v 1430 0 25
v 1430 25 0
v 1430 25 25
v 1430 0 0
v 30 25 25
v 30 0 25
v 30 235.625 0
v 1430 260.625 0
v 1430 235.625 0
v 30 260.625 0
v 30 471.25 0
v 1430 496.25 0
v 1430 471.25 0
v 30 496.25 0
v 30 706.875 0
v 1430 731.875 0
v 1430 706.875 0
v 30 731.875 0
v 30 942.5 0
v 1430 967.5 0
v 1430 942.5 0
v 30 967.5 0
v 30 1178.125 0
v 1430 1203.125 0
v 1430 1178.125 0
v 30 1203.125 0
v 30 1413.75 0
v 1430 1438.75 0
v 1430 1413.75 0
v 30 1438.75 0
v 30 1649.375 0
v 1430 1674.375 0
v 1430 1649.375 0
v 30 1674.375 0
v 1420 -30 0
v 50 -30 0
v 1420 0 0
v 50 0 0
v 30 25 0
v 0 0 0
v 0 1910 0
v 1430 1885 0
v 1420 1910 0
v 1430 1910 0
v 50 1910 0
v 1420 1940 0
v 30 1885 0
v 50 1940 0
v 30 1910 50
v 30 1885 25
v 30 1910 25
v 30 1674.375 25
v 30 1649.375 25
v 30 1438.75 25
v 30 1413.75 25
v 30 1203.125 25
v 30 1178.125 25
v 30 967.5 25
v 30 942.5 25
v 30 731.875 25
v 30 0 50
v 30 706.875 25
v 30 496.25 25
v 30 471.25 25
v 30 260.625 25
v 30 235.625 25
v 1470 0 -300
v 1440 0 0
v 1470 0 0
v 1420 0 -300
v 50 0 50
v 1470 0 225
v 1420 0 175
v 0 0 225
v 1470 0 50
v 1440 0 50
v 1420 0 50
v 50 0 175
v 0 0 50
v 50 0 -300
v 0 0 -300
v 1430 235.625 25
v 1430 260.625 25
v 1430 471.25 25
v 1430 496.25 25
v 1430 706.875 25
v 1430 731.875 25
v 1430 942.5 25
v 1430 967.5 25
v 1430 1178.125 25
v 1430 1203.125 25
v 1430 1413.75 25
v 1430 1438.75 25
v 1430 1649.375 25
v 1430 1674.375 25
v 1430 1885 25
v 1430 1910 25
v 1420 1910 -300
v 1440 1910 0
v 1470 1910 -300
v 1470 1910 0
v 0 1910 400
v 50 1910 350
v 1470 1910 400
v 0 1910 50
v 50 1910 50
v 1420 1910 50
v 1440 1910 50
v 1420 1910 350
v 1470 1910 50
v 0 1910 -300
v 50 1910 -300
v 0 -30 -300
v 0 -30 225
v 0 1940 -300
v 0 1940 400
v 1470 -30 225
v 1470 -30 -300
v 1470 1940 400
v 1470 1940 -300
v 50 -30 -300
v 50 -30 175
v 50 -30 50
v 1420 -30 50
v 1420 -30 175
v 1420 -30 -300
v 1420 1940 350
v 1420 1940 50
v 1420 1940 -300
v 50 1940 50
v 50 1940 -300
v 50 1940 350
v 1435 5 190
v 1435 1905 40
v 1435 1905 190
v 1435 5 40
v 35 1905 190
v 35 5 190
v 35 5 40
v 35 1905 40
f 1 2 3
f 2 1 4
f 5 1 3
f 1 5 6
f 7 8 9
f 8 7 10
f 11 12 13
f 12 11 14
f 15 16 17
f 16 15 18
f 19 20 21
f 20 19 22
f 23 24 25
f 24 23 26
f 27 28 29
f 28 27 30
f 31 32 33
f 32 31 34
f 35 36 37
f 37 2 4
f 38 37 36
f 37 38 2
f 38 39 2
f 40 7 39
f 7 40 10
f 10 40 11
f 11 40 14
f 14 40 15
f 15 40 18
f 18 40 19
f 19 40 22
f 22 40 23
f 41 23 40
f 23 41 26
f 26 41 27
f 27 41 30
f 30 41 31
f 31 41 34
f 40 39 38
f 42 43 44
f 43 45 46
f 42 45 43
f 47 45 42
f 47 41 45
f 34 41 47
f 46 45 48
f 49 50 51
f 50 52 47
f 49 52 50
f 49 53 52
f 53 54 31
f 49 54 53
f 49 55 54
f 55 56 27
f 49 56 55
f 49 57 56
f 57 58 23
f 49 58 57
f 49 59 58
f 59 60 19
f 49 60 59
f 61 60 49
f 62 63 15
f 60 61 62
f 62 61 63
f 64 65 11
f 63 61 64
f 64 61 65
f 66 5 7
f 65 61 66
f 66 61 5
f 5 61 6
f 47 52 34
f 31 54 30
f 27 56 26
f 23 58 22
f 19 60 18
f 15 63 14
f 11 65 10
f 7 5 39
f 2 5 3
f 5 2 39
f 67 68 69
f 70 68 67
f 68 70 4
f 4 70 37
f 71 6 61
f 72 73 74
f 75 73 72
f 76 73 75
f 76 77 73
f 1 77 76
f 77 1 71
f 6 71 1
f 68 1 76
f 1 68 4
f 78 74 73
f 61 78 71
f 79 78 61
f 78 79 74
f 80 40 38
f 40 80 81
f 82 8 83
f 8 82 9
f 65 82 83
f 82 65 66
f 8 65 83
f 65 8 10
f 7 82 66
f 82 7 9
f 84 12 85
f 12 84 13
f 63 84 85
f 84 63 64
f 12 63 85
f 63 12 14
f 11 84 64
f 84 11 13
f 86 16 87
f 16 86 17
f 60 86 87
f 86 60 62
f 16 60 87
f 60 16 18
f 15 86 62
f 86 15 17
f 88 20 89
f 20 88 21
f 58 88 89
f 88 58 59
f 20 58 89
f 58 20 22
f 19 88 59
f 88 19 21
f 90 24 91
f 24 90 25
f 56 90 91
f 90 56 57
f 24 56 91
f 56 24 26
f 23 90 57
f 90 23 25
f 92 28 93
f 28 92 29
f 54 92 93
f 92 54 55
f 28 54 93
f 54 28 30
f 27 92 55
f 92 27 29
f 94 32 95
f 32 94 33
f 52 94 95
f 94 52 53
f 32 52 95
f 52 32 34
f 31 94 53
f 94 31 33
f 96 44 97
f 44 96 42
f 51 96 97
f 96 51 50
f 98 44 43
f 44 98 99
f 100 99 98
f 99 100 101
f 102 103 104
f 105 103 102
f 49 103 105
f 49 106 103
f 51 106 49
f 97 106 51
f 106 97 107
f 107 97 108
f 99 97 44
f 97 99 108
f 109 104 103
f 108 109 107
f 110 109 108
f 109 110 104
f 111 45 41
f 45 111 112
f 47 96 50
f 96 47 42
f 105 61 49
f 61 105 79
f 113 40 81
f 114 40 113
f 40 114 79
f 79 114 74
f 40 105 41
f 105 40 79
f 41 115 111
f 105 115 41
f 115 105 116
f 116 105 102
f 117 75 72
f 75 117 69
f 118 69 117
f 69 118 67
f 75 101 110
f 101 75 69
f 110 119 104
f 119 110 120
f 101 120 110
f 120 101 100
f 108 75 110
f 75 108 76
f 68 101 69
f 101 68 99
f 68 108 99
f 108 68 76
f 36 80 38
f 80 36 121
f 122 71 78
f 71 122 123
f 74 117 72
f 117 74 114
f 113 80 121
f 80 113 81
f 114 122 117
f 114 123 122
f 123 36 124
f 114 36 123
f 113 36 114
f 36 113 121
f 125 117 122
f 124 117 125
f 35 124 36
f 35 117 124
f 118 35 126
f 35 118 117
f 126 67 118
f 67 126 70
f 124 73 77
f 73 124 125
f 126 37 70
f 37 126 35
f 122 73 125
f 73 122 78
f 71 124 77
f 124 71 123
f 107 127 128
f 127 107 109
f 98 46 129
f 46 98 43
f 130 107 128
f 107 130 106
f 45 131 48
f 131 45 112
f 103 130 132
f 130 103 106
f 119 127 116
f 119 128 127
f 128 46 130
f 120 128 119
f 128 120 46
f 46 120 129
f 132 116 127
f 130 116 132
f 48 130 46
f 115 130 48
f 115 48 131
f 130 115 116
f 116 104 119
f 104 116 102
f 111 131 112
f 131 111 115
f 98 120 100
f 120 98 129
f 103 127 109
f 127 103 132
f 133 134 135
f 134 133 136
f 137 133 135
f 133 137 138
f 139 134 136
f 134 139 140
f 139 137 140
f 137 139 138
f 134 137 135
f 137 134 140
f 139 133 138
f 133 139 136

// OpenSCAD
main_h = 30;
main_w = 50;

travessa_h = 25;
travessa_w = 25;

mattress_w = 1400;
mattress_l = 1900;
mattress_h = 150;

foot_h = 300;
footer_h = foot_h + travessa_w + mattress_h + main_w;
header_h = 700;

folga = 10;

estrado_h = 15;

WHITE = [ 1.0, 1.0, 1.0 ];
BLACK = [ 0.0, 0.0, 0.0 ];

N = 9;

del = ( mattress_l + folga - N * travessa_h ) / ( N - 1 );
echo( del );
echo( N * ( mattress_w + folga ) );

    // Laterais:
    
    translate( [ 0, 0, 0 ] )
        color( BLACK ) cube( [ main_h, mattress_l + folga, main_w ] );
    
    translate( [ mattress_w + folga + main_h, 0, 0 ] )
        color( BLACK ) cube( [ main_h, mattress_l + folga, main_w ] );
    
    // "pezeira":
    translate( [ 0, -main_h, -foot_h ] )
        color( BLACK ) cube( [ main_w, main_h, footer_h ] );
    translate( [ mattress_w + main_w - main_h, -main_h, -foot_h ] )
        color( BLACK ) cube( [ main_w, main_h, footer_h ] );
    translate( [ 0, -main_h, footer_h - foot_h - main_w ] )
        color( BLACK ) cube( [ mattress_w + folga + 2 * main_h, main_h, main_w ] );

    
    // Transversais:
    translate( [ main_w, -main_h, 0 ] )
        color( BLACK ) cube( [ mattress_w + folga - 2 * ( main_w - main_h ), main_h, main_w ] );
    translate( [ main_w, mattress_l + folga, 0 ] )
        color( BLACK ) cube( [ mattress_w + folga - 2 * ( main_w - main_h ), main_h, main_w ] );
        
    // Cabeceira:
    translate( [ 0, mattress_l + folga, -foot_h ] )
        color( BLACK ) cube( [ main_w, main_h, header_h ] );
    translate( [ mattress_w + main_w - main_h, mattress_l + folga, -foot_h ] )
        color( BLACK ) cube( [ main_w, main_h, header_h ] );
    translate( [ 0, mattress_l + folga, header_h - foot_h - main_w ] )
        color( BLACK ) cube( [ mattress_w + folga + 2 * main_h, main_h, main_w ] );

    
    echo( 2 * ( mattress_l + folga ) + 2 * footer_h + 2 * header_h + 2 * ( mattress_w + folga - 2 * ( main_w - main_h ) ) );
    
    // Colchão:
    color( WHITE )
        translate( [ main_h + folga / 2, folga / 2, travessa_h + estrado_h ] )
            cube( [ mattress_w, mattress_l, mattress_h ] );
            
    // Estrado:
    for ( i = [ 0 : N - 1 ] ) {
            translate( [ main_h, i * ( del + travessa_h ), 0 ] )
                color( BLACK ) cube( [ mattress_w, travessa_h, travessa_w ] );
    }
    
